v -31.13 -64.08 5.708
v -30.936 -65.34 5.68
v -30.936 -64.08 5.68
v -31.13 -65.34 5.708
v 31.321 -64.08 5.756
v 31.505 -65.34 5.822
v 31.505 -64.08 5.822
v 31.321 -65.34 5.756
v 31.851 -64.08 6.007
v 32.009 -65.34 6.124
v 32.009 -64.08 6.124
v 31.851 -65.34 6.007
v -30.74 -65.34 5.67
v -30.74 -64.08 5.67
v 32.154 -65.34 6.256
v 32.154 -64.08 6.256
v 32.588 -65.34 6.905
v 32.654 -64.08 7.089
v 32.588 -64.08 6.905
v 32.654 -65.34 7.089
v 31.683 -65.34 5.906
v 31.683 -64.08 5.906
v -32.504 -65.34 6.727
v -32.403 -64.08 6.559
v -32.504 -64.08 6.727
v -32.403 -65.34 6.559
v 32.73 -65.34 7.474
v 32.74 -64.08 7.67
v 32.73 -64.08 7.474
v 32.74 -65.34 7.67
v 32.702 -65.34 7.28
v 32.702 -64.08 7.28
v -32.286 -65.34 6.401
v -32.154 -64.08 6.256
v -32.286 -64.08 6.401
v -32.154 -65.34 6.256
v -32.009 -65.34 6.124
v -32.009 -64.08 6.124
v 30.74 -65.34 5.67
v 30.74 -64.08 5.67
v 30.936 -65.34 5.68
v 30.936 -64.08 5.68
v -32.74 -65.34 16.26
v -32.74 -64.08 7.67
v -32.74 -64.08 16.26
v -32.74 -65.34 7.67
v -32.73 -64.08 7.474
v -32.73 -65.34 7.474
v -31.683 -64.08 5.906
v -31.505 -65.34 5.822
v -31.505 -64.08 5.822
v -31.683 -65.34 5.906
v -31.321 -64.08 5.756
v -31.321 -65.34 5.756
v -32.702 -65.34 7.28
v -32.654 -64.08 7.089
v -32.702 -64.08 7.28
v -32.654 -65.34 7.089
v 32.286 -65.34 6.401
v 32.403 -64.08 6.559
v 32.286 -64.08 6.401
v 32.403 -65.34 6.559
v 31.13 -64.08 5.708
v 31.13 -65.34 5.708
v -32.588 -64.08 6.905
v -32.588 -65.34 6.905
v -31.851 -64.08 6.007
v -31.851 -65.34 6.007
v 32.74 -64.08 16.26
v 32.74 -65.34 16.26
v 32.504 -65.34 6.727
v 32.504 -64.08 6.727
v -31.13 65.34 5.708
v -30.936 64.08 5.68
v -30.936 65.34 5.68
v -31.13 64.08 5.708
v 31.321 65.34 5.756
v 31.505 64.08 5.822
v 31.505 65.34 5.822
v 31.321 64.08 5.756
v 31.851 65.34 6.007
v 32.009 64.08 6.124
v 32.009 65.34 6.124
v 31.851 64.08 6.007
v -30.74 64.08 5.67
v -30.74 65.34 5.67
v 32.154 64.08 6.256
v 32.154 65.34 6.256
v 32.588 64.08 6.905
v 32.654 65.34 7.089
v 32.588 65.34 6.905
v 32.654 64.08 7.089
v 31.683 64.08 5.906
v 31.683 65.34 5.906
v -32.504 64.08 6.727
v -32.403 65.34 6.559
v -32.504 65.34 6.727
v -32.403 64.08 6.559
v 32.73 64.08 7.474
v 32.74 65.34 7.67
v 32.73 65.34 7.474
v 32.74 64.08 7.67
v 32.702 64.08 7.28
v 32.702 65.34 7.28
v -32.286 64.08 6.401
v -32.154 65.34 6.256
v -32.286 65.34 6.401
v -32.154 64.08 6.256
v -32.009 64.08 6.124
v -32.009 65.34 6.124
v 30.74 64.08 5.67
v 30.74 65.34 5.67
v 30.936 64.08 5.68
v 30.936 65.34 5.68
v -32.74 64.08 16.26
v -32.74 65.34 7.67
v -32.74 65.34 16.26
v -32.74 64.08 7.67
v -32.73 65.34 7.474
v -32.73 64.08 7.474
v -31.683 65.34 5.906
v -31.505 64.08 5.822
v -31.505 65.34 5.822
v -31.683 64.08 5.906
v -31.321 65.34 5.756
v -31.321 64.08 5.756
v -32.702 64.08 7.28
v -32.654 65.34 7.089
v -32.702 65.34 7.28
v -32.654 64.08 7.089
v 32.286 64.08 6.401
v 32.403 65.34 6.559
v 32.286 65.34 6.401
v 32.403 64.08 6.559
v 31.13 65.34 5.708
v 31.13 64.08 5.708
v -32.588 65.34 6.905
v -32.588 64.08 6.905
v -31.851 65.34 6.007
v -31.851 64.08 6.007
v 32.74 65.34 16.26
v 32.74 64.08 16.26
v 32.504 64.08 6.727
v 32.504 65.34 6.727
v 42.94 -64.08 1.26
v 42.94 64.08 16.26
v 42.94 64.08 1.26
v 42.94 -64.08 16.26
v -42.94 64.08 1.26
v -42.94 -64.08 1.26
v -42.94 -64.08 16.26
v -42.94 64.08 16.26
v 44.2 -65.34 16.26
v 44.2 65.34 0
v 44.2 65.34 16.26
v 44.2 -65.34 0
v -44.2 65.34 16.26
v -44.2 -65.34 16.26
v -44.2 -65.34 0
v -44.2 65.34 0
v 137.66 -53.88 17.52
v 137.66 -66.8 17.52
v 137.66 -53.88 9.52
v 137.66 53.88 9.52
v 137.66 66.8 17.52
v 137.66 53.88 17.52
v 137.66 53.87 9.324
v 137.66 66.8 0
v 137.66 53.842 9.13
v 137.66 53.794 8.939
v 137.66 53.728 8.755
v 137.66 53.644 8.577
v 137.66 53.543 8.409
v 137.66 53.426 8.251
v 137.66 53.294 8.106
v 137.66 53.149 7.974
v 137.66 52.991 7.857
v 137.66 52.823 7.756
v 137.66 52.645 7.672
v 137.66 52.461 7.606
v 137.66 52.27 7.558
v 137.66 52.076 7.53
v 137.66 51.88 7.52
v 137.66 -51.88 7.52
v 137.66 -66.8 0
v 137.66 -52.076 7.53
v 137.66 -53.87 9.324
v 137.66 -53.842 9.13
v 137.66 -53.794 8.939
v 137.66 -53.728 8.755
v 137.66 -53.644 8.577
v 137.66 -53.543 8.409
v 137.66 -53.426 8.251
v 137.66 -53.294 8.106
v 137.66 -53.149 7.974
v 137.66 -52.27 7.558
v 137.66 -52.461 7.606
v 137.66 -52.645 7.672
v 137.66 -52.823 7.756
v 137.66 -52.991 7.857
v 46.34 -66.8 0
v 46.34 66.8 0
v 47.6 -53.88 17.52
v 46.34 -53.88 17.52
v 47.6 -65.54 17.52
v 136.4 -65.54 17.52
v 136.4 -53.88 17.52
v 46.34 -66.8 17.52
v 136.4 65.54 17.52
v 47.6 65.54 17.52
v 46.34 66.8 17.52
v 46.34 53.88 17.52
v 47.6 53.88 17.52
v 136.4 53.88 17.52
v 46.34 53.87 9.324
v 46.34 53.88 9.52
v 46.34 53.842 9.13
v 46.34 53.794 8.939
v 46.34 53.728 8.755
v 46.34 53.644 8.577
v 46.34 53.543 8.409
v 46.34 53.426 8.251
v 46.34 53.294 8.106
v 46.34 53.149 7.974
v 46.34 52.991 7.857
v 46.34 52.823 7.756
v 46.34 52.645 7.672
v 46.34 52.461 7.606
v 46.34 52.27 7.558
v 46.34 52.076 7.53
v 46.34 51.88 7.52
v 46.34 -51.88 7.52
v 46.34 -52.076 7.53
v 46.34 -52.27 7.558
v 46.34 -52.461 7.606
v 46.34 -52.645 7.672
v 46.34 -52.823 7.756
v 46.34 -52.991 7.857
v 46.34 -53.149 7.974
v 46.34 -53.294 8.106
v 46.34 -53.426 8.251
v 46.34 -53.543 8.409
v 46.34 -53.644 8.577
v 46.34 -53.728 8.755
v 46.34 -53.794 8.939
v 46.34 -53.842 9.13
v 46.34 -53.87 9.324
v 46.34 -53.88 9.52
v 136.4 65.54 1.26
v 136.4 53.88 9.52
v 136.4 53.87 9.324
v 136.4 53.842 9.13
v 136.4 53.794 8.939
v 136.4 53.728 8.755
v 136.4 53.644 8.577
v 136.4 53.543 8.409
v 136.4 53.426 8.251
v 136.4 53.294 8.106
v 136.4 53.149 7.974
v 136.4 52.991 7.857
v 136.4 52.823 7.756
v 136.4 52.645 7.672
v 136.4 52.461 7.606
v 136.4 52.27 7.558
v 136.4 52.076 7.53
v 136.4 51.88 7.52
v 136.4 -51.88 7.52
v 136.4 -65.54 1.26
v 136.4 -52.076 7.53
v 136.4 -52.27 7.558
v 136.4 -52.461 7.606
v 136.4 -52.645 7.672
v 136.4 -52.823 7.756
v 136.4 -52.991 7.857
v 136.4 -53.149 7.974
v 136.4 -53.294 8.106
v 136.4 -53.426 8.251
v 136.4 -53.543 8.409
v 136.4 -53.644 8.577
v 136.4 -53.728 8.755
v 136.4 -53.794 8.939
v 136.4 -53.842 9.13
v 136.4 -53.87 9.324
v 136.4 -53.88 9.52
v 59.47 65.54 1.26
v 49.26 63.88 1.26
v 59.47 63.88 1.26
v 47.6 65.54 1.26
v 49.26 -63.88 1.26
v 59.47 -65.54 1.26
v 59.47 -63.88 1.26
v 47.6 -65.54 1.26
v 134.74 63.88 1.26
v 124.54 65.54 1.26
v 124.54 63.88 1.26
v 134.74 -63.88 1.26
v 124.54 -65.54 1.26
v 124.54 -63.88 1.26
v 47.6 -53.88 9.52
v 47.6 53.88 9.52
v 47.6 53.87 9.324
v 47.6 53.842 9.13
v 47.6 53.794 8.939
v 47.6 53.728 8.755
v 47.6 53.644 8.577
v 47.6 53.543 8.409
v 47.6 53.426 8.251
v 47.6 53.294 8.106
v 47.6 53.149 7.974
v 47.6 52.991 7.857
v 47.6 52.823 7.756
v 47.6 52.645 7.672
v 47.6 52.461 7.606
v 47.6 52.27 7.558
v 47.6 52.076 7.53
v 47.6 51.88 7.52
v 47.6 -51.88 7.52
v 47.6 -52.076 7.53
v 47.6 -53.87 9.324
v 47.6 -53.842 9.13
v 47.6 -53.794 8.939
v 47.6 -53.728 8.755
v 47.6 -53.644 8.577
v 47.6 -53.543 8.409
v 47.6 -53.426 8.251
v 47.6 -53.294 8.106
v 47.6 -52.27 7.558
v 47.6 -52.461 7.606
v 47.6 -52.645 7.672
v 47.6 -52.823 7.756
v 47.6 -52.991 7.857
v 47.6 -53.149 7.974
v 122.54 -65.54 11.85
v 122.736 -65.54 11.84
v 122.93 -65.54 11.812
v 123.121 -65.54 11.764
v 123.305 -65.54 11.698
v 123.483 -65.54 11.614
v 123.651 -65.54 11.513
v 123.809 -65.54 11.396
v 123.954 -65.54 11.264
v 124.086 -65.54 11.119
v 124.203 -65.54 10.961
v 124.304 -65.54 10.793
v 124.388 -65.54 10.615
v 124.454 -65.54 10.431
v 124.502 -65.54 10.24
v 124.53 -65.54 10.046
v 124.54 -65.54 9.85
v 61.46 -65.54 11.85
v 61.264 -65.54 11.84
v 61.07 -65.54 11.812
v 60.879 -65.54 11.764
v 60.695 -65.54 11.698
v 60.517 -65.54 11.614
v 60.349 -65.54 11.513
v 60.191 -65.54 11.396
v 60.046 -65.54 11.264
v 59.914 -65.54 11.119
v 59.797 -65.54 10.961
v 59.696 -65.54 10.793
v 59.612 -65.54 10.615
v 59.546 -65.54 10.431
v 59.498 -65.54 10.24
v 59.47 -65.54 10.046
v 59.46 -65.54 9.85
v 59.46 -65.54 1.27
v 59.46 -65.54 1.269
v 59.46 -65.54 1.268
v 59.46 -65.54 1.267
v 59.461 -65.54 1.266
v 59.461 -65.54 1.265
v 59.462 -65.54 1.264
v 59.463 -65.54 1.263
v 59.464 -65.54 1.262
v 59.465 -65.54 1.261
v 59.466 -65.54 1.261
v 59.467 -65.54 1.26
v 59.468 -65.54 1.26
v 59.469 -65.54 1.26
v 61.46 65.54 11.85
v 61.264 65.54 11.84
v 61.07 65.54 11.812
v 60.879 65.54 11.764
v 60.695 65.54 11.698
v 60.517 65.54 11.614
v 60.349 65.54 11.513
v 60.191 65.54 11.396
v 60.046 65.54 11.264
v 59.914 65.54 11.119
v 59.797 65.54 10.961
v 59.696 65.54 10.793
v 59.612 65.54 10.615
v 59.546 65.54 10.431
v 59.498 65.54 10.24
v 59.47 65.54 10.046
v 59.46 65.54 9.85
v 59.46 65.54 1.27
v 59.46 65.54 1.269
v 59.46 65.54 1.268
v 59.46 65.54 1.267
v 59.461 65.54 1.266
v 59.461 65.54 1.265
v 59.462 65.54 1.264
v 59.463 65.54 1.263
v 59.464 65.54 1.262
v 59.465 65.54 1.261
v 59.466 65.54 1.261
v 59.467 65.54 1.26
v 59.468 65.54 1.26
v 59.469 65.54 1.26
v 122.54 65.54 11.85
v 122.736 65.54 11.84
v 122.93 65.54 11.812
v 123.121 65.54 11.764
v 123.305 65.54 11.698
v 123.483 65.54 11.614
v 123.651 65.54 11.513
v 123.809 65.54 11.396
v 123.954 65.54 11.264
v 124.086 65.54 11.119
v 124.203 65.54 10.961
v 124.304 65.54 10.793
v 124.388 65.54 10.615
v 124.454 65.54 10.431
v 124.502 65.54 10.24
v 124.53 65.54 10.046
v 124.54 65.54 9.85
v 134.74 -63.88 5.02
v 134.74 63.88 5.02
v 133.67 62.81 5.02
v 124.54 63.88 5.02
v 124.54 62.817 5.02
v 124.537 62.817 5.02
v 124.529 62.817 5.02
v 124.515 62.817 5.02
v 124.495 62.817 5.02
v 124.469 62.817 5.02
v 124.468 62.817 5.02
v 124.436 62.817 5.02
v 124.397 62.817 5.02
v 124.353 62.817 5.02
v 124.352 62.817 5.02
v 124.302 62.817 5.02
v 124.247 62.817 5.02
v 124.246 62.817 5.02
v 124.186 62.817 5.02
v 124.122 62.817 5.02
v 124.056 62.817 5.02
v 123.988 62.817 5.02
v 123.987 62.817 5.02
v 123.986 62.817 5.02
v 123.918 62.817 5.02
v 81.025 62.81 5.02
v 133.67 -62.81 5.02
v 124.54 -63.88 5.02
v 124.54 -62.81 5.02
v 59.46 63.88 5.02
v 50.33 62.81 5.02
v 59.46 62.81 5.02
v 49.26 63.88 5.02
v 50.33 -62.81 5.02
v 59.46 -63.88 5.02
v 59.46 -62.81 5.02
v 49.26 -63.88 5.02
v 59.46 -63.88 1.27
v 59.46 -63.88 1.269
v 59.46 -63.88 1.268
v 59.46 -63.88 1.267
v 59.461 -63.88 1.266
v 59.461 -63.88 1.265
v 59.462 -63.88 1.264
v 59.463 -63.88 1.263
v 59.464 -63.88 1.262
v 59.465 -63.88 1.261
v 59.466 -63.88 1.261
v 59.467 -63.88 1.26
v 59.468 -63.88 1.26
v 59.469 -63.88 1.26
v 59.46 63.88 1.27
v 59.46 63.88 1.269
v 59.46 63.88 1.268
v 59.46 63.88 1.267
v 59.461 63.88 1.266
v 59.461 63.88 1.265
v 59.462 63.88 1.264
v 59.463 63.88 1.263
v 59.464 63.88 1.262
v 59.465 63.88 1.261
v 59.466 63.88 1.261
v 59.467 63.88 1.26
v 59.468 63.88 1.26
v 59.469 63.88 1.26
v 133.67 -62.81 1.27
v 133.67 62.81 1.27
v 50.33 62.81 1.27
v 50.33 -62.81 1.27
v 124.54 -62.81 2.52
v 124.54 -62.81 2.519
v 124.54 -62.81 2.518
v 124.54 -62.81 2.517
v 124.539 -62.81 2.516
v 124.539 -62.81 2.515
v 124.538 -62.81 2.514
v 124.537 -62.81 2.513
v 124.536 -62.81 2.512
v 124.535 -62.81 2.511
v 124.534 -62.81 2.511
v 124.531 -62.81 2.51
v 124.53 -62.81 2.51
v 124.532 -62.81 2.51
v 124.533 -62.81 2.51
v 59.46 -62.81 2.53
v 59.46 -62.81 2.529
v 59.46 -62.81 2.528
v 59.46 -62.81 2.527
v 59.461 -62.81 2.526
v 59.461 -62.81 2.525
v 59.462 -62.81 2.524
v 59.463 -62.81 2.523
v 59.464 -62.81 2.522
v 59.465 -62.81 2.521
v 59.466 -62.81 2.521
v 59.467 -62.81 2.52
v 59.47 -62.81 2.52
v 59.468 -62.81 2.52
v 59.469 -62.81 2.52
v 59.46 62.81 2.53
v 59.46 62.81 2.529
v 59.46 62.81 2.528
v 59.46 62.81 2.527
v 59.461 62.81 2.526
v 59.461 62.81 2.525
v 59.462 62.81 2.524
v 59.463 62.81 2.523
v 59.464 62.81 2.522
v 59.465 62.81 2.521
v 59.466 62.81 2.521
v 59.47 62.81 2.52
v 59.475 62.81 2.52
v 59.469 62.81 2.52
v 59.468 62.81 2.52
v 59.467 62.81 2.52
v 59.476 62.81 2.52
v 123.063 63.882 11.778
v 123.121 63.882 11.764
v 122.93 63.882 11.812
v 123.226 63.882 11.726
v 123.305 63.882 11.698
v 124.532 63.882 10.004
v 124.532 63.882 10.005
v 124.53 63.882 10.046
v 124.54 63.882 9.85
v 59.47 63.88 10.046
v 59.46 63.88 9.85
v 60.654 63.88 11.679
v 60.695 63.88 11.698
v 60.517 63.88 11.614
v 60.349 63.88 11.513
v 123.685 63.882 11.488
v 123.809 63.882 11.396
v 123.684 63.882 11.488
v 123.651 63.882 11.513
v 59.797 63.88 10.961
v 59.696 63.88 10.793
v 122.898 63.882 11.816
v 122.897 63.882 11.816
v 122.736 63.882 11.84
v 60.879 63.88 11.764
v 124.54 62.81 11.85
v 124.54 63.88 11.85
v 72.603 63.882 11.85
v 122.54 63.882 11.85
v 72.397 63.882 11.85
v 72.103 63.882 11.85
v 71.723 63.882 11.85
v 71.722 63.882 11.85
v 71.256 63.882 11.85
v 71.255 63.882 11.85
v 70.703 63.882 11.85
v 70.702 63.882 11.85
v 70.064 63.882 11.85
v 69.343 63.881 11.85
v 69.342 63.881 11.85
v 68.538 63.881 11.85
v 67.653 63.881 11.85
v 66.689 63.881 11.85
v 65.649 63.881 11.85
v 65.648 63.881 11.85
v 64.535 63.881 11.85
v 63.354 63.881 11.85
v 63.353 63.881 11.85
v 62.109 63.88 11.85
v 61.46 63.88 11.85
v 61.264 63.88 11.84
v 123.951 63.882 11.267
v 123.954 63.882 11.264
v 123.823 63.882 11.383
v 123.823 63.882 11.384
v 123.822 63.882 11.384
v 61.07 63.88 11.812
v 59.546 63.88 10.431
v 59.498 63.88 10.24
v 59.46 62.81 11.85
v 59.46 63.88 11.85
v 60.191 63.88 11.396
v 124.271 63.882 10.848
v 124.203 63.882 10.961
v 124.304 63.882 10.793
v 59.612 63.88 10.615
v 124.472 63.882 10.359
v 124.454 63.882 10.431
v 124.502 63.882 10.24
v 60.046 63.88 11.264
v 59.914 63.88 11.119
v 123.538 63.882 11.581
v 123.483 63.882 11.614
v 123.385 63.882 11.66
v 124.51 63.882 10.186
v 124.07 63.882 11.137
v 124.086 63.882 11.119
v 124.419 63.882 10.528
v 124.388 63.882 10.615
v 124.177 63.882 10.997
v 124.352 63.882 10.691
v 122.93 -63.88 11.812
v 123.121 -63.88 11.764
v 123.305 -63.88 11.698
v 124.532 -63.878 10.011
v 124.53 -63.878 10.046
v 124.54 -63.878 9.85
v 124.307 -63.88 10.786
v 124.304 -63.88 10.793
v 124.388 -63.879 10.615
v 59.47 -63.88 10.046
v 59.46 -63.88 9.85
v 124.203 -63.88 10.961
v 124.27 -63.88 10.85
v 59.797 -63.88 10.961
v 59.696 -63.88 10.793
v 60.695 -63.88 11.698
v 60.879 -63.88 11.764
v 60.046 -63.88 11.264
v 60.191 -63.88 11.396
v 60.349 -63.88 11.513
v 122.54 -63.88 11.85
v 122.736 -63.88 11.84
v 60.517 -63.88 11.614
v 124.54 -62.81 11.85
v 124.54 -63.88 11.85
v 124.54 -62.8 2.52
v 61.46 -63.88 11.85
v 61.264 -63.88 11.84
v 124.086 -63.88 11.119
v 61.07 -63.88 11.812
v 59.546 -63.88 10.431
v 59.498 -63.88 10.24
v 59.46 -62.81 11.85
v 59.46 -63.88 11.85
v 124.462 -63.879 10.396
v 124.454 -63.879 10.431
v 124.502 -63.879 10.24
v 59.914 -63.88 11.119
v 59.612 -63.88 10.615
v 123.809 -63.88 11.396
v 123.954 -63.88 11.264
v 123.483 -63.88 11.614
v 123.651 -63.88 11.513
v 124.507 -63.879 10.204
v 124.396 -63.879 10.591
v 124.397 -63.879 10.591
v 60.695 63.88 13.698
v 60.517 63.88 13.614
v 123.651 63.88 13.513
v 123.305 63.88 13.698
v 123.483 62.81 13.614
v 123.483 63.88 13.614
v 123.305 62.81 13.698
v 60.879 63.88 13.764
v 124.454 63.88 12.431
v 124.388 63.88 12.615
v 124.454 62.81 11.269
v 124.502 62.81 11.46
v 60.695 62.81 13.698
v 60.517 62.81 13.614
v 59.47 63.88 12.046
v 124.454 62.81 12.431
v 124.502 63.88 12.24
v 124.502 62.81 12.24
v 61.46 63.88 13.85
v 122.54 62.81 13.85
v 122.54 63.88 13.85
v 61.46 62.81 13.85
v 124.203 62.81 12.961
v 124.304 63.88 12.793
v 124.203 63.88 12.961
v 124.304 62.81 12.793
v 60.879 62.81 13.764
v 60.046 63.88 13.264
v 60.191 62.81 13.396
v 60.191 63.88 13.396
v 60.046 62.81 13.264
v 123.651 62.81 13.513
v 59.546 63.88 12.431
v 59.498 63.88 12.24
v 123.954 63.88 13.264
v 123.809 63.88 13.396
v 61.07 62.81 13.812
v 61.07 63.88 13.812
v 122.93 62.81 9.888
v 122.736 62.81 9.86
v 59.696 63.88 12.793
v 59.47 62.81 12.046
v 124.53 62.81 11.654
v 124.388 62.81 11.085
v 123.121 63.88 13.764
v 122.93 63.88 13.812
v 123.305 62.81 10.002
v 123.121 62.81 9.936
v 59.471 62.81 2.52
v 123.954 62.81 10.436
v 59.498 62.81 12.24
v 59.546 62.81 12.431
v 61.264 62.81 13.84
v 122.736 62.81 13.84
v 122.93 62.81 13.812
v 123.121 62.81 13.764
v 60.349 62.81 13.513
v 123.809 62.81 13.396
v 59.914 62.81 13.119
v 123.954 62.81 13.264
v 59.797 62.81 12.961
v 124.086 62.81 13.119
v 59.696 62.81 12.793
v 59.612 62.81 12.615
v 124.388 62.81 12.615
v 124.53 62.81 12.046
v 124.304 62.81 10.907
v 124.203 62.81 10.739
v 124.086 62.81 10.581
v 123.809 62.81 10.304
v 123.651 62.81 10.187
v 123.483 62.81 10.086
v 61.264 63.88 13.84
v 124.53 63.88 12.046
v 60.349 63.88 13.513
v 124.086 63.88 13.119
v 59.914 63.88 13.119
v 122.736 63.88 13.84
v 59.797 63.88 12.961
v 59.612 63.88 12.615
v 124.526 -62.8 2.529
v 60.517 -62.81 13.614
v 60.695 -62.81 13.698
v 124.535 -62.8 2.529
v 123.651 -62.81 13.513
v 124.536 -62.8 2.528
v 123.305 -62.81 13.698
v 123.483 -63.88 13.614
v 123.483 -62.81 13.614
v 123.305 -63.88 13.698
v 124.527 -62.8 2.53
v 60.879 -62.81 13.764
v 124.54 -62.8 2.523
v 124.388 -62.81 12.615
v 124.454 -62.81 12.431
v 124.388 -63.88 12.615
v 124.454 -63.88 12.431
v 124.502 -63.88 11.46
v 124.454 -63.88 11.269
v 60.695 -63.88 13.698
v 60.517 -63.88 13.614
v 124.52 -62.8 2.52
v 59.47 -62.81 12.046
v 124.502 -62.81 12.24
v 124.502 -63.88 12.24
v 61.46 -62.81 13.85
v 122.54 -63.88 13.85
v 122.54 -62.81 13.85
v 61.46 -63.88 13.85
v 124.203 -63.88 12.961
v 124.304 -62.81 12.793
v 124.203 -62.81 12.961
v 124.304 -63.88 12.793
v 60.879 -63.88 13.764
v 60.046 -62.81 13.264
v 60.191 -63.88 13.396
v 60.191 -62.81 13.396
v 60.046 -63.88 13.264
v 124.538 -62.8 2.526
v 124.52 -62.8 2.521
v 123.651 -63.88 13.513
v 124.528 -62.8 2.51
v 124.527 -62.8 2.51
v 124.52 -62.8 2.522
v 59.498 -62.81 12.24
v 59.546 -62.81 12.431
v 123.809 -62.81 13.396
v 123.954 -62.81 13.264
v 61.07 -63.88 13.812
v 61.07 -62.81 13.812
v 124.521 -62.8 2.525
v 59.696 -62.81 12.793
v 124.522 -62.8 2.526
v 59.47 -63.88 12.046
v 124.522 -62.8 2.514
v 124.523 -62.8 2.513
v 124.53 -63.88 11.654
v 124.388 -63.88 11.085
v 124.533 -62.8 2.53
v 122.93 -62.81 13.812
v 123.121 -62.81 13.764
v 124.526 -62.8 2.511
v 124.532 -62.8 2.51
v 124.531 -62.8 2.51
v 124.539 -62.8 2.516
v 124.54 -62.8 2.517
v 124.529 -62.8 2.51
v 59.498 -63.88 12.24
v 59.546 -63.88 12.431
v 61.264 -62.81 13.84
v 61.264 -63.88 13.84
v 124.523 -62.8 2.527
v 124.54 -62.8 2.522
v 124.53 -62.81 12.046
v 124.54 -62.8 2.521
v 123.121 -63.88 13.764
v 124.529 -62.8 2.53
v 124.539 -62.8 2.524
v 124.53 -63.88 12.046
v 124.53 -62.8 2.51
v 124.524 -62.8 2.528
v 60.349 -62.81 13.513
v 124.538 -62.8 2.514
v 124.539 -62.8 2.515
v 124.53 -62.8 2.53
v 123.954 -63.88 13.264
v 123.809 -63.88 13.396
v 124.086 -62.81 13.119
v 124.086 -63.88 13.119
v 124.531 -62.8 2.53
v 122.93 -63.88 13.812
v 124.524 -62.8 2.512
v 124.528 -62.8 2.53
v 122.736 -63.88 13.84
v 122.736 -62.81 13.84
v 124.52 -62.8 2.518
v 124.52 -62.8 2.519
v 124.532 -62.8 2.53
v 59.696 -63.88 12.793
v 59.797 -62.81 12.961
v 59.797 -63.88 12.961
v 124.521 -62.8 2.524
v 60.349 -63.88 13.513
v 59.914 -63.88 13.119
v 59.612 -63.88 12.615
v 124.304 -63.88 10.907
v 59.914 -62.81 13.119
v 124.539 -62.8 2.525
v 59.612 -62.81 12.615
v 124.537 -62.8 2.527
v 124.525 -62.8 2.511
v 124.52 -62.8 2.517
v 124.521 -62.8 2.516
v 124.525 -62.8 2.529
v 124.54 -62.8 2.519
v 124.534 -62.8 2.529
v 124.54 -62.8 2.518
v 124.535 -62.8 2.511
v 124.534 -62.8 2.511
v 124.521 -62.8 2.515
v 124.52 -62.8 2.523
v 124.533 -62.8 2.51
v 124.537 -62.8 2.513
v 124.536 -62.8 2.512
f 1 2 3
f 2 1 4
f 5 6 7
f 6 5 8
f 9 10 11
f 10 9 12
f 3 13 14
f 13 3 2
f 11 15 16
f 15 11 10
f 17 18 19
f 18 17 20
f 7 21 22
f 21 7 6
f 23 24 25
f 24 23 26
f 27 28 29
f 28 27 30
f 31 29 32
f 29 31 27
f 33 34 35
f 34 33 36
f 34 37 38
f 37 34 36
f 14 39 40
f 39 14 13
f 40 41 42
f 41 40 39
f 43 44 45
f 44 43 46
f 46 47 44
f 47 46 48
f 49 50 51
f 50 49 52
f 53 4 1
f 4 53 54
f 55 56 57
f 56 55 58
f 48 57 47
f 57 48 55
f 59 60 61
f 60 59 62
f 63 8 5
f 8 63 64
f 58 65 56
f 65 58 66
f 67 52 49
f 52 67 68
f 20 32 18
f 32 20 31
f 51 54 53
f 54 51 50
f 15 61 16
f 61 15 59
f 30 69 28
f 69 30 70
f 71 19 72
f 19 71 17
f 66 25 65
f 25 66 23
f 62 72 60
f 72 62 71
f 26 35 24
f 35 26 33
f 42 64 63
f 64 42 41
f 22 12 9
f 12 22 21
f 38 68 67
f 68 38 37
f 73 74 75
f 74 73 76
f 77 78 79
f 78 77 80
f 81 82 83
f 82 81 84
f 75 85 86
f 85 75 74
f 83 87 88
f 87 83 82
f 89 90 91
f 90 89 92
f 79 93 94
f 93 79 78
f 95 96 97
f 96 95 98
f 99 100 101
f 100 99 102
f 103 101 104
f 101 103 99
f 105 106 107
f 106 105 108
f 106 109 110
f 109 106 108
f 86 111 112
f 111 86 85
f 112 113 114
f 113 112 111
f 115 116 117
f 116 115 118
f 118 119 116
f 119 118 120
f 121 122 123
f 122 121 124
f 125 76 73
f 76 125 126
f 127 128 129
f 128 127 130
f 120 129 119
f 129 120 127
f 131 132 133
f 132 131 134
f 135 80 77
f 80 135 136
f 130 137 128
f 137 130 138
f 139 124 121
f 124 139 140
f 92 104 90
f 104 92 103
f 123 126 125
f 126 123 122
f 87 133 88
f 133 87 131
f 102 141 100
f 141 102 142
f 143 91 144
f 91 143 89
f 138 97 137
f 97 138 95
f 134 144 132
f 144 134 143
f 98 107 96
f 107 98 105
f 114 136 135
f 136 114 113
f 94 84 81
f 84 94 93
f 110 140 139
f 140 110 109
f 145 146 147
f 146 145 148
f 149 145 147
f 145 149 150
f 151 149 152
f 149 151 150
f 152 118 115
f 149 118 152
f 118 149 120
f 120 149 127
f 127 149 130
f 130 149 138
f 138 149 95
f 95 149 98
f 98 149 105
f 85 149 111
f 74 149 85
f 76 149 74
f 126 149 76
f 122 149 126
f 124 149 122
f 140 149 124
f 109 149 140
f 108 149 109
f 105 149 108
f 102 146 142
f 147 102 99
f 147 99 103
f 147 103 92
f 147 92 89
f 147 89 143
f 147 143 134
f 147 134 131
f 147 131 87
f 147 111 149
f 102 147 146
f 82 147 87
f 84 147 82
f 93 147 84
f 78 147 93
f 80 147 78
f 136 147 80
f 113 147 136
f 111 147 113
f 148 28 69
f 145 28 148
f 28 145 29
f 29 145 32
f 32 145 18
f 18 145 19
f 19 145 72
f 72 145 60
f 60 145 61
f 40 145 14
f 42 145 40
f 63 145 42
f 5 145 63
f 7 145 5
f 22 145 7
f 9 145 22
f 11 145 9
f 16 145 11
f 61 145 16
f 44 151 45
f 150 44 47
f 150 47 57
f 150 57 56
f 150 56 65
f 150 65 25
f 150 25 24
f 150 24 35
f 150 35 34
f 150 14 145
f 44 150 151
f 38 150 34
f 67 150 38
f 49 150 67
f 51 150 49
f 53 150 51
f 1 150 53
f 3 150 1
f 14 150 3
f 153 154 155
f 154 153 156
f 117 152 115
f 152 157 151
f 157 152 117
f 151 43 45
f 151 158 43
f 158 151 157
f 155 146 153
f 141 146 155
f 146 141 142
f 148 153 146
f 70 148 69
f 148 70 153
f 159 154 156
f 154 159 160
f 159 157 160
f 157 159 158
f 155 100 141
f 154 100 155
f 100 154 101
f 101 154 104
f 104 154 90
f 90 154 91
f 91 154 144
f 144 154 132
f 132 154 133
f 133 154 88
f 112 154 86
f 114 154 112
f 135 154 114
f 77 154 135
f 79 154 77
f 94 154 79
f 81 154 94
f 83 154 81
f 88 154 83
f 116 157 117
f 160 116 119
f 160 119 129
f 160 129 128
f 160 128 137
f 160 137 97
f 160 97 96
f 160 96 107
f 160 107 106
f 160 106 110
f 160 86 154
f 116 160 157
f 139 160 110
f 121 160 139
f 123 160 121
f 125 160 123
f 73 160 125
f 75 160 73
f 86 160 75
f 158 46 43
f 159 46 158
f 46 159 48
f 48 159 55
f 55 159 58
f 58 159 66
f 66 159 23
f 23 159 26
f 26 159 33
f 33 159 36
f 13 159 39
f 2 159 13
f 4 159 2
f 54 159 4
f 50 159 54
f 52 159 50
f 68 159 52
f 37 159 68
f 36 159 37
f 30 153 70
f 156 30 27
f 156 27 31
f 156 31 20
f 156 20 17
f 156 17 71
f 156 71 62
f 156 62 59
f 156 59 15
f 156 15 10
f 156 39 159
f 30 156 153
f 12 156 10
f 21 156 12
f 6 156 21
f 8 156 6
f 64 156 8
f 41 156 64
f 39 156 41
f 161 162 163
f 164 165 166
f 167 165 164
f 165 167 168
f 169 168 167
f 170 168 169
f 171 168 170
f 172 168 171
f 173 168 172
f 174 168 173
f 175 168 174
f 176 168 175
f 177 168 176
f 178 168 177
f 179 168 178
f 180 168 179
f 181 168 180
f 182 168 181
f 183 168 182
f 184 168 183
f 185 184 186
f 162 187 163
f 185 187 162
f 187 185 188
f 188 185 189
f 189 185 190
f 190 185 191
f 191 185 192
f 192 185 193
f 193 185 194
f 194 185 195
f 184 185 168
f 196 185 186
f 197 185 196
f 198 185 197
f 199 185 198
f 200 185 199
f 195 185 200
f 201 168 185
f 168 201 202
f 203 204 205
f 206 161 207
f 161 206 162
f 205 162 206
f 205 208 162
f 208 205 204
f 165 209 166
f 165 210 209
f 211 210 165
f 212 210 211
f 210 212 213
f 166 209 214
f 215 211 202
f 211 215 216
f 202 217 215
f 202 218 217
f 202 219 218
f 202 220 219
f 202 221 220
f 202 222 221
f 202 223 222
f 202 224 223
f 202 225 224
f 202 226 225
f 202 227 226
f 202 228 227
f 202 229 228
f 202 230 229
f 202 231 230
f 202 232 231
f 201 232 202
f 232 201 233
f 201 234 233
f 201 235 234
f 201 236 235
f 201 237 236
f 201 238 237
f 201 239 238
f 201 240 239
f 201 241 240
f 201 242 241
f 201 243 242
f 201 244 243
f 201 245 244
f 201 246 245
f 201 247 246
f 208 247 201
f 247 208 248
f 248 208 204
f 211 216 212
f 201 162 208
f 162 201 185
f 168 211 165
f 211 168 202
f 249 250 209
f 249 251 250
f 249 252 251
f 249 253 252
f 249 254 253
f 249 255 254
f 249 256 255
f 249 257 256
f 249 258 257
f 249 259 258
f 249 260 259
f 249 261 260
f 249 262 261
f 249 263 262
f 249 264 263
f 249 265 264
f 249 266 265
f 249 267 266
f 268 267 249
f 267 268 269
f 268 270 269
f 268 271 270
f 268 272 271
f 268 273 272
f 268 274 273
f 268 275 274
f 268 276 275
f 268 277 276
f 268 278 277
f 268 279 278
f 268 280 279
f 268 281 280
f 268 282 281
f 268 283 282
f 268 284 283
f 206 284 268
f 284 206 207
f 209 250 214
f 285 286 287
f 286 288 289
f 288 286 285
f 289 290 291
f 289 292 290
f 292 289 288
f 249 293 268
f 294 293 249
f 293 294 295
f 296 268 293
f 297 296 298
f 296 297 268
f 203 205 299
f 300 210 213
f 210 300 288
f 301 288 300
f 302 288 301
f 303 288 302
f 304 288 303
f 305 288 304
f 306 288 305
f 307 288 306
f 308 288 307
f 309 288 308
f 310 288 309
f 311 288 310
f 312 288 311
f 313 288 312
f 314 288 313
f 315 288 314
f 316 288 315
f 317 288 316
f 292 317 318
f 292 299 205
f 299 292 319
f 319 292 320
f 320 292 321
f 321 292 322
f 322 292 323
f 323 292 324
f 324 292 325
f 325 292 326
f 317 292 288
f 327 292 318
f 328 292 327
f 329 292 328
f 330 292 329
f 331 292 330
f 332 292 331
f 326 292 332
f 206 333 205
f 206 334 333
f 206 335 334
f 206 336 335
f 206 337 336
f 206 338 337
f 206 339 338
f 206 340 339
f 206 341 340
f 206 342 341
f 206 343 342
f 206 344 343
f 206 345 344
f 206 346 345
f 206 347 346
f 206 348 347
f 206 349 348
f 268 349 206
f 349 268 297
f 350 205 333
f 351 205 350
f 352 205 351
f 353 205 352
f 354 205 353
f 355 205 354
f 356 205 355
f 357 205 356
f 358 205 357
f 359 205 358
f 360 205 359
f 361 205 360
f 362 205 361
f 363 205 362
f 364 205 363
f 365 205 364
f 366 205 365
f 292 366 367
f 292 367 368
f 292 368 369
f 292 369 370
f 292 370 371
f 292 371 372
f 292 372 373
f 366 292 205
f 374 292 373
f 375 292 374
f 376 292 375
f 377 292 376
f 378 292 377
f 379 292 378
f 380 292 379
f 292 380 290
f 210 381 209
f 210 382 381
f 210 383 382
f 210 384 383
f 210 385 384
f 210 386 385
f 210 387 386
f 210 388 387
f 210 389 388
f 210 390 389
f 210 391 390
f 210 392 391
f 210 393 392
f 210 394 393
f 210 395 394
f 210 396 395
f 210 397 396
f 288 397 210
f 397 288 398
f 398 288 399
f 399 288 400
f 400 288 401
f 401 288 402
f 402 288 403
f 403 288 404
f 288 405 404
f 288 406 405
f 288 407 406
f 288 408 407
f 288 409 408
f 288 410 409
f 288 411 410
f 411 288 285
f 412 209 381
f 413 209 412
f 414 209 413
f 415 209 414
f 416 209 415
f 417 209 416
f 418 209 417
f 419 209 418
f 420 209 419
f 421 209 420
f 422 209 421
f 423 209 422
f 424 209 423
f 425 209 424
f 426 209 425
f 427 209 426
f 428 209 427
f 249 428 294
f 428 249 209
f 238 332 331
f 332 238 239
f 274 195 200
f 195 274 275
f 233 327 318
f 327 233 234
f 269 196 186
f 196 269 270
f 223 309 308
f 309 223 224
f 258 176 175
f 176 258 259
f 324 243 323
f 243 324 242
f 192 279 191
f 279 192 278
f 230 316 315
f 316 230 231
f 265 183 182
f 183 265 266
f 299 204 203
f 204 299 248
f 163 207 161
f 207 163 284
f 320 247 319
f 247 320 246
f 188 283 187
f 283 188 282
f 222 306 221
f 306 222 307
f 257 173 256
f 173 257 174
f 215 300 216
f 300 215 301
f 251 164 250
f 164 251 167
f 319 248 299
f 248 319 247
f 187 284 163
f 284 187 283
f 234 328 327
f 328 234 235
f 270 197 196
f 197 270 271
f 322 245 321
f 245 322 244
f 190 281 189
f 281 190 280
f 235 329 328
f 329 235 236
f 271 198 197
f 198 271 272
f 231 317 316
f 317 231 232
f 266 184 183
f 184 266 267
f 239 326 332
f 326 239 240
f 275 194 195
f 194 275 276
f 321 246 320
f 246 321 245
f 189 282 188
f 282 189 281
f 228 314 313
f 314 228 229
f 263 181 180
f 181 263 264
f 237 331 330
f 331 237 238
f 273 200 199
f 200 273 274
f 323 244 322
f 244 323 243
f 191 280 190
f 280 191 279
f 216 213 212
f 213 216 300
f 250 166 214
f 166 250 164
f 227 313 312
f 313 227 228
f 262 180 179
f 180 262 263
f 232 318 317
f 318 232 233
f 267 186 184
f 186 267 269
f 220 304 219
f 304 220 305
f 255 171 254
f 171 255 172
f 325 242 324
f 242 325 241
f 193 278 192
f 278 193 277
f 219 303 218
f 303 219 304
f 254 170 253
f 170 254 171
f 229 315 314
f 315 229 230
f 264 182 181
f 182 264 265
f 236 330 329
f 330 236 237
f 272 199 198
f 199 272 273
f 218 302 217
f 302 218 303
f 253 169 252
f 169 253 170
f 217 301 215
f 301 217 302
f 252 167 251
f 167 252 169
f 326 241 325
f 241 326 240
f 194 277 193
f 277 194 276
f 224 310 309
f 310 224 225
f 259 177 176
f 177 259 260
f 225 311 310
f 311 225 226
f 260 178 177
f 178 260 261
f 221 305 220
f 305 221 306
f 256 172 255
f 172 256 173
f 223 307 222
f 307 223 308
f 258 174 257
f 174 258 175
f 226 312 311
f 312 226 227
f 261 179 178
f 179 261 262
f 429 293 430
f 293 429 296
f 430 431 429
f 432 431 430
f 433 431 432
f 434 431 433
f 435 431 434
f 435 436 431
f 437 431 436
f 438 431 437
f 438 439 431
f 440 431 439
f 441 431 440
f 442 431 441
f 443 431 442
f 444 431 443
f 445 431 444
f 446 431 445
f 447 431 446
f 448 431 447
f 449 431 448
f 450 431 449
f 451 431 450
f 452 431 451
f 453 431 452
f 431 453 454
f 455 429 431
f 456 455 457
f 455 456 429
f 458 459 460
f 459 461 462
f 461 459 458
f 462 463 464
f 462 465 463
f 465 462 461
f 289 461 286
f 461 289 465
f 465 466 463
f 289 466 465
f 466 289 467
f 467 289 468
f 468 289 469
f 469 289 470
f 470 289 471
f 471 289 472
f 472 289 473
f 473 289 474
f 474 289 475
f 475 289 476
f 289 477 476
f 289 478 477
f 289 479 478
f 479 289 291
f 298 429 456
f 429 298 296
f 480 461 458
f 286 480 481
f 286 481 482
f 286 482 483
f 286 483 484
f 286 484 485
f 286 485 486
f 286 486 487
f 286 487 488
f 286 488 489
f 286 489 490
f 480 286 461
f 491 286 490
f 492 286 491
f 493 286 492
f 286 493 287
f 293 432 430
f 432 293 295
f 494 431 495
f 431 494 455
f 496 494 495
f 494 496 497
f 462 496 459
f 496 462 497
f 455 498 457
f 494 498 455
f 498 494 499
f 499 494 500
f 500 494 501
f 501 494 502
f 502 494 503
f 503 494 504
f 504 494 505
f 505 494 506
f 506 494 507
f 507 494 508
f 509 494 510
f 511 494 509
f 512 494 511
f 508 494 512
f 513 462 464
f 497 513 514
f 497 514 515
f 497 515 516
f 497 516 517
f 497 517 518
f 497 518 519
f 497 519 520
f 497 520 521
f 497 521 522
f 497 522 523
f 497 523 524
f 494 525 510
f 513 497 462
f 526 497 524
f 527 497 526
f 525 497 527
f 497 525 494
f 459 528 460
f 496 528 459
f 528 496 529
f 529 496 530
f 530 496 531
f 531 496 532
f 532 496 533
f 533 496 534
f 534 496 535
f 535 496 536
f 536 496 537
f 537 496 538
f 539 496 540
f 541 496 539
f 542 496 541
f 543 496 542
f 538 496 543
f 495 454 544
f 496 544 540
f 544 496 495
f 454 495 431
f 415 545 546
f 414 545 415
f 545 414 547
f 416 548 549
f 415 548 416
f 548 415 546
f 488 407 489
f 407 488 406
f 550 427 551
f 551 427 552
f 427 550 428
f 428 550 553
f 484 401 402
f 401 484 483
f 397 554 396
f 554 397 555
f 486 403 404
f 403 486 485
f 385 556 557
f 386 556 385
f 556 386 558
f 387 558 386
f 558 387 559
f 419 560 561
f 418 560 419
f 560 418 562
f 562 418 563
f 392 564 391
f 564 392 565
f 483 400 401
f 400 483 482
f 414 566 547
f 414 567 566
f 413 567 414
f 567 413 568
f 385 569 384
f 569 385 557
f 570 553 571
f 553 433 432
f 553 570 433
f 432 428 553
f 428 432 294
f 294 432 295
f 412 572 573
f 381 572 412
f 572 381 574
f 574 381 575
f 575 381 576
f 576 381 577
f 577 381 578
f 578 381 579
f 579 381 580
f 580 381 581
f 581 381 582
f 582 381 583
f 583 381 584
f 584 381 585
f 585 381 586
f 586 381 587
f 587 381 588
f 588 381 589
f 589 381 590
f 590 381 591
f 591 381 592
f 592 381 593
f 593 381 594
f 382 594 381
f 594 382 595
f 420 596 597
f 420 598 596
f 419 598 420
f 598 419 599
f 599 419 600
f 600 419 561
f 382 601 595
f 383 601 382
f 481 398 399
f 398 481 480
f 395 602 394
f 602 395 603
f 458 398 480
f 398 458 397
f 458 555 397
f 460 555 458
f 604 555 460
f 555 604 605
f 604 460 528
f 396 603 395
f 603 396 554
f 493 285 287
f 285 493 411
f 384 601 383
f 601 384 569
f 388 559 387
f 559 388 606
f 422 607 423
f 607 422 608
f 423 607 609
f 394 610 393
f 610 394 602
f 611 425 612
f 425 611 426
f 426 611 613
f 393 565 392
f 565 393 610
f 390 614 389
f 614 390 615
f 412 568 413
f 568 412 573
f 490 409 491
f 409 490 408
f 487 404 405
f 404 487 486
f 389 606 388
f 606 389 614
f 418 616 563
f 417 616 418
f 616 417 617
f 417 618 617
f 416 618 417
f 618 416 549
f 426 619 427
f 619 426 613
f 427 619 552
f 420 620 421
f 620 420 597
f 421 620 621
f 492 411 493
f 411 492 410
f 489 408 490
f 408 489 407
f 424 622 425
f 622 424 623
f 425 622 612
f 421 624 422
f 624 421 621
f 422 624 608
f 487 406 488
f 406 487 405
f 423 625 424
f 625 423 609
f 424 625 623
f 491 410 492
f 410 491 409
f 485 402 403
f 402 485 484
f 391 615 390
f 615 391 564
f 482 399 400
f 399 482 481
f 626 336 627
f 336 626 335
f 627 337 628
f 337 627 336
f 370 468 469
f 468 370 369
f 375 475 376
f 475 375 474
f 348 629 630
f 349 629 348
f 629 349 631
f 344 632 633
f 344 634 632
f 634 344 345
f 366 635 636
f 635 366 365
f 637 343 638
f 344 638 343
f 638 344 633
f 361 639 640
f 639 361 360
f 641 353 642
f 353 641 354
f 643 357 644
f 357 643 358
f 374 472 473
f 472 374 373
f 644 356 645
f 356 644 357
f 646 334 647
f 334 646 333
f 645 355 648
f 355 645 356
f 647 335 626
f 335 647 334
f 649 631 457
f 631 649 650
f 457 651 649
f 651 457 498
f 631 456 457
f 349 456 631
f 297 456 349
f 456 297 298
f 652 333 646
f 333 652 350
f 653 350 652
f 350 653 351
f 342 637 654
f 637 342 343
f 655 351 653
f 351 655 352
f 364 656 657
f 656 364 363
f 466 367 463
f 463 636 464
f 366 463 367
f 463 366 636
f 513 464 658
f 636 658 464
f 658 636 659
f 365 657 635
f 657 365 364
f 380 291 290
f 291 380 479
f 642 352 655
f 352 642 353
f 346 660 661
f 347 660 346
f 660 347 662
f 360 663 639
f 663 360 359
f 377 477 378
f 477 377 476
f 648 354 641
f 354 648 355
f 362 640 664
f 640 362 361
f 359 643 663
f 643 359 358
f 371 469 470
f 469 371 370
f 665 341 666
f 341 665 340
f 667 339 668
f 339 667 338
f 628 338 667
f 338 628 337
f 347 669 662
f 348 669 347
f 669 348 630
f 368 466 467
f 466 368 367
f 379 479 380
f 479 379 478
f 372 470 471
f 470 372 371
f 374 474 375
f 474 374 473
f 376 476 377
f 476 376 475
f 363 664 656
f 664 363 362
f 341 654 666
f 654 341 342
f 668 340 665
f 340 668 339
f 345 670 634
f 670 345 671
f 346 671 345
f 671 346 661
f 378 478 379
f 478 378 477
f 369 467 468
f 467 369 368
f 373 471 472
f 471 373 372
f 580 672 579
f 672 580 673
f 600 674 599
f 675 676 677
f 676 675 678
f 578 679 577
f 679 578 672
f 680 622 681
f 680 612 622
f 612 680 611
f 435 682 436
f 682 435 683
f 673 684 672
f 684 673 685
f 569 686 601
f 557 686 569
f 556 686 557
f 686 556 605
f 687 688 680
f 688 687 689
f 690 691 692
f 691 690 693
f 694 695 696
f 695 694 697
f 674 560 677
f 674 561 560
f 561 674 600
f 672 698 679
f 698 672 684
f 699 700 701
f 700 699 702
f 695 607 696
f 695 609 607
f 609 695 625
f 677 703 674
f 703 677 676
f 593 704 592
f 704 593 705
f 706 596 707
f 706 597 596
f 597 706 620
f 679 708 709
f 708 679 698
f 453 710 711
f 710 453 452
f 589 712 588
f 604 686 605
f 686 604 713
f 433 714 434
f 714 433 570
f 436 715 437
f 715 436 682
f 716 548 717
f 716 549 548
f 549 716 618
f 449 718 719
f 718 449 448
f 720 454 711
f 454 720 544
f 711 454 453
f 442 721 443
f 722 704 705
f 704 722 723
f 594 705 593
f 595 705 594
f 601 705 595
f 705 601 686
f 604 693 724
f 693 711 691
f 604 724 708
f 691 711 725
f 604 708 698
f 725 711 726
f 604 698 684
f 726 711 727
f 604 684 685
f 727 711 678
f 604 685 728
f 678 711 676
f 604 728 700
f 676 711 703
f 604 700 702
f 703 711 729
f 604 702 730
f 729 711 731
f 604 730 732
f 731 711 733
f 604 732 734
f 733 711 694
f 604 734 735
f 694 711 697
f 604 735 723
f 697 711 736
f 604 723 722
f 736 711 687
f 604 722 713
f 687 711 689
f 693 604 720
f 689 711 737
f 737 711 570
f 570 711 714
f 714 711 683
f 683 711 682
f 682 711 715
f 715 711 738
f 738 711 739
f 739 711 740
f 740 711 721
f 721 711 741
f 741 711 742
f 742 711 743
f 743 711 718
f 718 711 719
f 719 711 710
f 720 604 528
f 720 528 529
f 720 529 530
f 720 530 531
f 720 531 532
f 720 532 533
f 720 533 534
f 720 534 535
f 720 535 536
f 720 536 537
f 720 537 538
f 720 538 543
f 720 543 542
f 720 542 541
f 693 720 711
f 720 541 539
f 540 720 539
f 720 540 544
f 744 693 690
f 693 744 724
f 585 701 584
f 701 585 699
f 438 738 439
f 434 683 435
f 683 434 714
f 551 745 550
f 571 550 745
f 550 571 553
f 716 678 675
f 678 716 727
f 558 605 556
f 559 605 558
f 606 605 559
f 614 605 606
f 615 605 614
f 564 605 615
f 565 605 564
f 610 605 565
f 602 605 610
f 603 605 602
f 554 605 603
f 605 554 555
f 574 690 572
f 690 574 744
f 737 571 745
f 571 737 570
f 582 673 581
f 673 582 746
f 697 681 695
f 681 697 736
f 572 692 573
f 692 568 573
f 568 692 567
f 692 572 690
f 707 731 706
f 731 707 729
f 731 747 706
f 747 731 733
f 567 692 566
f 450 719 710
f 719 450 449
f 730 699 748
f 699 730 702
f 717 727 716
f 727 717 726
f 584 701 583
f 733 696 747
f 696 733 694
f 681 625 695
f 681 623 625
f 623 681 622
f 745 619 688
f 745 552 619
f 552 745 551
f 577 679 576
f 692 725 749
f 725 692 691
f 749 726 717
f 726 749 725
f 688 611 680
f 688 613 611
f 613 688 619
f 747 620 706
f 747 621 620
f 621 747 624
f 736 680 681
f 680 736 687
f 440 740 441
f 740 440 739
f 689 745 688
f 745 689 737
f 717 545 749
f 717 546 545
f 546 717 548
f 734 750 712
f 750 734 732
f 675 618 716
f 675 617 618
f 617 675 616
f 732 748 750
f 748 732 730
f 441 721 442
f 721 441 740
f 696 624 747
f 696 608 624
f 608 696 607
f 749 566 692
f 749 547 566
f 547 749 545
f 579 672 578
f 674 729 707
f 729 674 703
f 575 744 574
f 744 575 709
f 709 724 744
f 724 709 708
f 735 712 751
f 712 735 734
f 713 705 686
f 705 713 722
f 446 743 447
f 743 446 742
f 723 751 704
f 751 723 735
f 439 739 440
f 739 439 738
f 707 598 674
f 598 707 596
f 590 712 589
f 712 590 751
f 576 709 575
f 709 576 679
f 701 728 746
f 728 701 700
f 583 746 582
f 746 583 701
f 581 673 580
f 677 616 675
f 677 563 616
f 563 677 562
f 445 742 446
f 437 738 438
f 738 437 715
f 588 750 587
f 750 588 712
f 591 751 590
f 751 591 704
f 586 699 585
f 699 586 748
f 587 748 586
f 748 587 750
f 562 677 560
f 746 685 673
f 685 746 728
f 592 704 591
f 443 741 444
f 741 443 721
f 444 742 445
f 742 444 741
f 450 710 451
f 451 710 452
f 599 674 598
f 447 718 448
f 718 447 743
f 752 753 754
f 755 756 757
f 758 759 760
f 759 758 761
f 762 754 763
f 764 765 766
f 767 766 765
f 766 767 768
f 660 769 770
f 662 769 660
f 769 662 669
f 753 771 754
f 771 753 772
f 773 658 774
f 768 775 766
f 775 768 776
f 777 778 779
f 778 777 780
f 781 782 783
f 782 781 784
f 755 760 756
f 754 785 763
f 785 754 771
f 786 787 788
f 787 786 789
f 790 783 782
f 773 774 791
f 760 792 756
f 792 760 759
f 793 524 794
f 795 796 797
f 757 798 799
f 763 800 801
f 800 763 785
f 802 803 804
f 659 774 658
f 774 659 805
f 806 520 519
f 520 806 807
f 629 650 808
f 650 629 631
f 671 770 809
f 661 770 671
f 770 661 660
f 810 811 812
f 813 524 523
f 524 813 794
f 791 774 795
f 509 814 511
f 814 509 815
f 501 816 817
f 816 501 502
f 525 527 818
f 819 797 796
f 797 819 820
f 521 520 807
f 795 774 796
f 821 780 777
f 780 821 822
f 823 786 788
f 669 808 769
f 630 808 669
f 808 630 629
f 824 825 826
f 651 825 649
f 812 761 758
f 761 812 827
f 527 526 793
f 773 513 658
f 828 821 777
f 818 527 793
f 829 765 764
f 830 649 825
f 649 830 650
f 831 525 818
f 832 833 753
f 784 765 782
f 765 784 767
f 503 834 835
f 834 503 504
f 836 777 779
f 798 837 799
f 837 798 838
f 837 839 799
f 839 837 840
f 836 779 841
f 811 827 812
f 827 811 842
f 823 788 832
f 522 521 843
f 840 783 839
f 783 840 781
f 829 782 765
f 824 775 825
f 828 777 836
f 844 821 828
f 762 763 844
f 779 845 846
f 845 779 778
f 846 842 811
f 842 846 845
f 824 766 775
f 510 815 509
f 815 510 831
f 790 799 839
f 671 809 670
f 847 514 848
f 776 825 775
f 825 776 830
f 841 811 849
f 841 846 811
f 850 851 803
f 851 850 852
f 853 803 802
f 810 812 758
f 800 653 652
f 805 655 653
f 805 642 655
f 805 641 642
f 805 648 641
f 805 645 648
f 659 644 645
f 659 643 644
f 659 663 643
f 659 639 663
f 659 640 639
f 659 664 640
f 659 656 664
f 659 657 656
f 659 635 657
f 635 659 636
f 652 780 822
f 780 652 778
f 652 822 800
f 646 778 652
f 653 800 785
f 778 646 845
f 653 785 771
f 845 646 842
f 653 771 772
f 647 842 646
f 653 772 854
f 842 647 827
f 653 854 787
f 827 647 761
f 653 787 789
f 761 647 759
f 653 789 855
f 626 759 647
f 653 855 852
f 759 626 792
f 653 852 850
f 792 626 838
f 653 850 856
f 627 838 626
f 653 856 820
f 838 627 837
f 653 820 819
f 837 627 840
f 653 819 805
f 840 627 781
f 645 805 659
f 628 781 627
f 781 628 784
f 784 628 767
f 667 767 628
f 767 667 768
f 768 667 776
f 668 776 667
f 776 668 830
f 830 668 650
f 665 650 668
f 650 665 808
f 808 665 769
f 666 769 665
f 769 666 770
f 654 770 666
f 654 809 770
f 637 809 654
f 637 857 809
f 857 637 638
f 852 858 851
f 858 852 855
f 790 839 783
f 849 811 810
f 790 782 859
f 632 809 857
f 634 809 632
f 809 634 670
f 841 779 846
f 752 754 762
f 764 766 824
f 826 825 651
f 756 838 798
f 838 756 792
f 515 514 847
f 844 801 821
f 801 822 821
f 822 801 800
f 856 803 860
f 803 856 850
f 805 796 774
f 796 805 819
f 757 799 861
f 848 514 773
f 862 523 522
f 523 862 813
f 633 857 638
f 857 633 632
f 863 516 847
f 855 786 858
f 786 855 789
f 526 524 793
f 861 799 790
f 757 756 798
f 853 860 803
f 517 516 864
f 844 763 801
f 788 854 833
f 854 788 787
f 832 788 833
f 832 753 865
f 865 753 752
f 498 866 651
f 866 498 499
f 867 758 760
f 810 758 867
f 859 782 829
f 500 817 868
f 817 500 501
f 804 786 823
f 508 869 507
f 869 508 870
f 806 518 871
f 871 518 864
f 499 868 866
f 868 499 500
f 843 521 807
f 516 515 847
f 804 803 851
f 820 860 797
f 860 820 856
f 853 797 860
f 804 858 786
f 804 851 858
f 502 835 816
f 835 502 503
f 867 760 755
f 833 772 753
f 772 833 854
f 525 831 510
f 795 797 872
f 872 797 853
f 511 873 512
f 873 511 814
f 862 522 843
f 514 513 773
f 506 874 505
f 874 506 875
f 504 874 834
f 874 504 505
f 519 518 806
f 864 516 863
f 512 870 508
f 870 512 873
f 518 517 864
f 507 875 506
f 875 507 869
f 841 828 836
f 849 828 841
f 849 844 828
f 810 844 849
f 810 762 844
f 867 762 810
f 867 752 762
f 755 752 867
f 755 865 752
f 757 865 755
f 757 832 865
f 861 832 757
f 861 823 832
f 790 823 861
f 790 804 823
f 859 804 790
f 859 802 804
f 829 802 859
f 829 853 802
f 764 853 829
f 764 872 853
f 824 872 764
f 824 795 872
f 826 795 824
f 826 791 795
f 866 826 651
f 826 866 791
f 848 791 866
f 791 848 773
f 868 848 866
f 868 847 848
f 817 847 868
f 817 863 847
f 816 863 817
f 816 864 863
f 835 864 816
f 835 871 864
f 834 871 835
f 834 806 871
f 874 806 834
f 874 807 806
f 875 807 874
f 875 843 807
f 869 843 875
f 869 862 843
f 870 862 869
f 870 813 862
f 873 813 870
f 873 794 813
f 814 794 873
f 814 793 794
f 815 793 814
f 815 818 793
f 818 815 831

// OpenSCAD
// file: modules/SLAS_plate.scad
SLAS_PLATE_WIDTH = 85.48;
SLAS_PLATE_DEPTH = 127.76;
SLAS_PLATE_FLANGE_WIDTH = 1.27;

SLAS_PLATE_FLANGE_HEIGHT_SHORT = 2.41; 
SLAS_PLATE_FLANGE_WIDTH = 1.27;
SLAS_PLATE_FLANGE_RADIUS_OUTSIDE_CORNER = 3.18;
// main file
// Two-piece box for SLAS plates. v1.0.0
// Last updated: 2023-10-24
// (c) Constantine Evans, 2023.
// SPDX-License-Identifier:  CC-BY-SA-4.0

$fn = 64;


// Maximum total height of the plate.
plate_max_height = 15;

// SLAS flange height values.
plate_flange_height = 2.41; // [2.41:short, 6.10:medium, 7.62:tall]

// (elements will be multiples of this thickness)
base_thickness = 0.42;
bottom_multiple = 3;
wall_multiple = 3;

// Components will be separated by this tolerance.
inside_tolerance = 0.2;

bottom_thickness = bottom_multiple*base_thickness;
wall_thickness = wall_multiple*base_thickness;

include_components = "both"; // ["top", "bottom", "both"]


if (include_bottom) {
bottom(plate_max_height=plate_max_height, plate_flange_height=plate_flange_height);
}

// Minimal offset to avoid OpenSCAD problems.
minimal_offset = 0.01;


include_top = (include_components == "top" || include_components == "both");
include_bottom = (include_components == "bottom" || include_components == "both");

include <modules/SLAS_plate.scad>


if (include_top) {
translate([include_bottom ? SLAS_PLATE_WIDTH+wall_thickness*2+4 : 0,0,plate_max_height+bottom_thickness*2])
rotate([180,0,0])
top(plate_max_height=plate_max_height, plate_flange_height=plate_flange_height);
}


module extruded_rounded_rectangle(w, h, d, r) {
    hull() {
        translate([-w/2+r, -h/2+r, 0]) cylinder(r=r, h=d, center=true);
        translate([w/2-r, -h/2+r, 0]) cylinder(r=r, h=d, center=true);
        translate([-w/2+r, h/2-r, 0]) cylinder(r=r, h=d, center=true);
        translate([w/2-r, h/2-r, 0]) cylinder(r=r, h=d, center=true);
    }
}

module extruded_half_rounded_rectangle(w, h, d, r) {
    hull() {
        translate([-w/2+r, -h/2+r, 0]) cylinder(r=r, h=d, center=true);
        translate([w/2-r, -h/2+r, 0]) cylinder(r=r, h=d, center=true);
        translate([-w/2+minimal_offset, h/2-minimal_offset, 0]) cylinder(r=minimal_offset, h=d, center=true);
        translate([w/2-minimal_offset, h/2-0, minimal_offset]) cylinder(r=minimal_offset, h=d, center=true);
    }
}

module bottom(plate_max_height=17, plate_flange_height=2.41, neg=false) {

eh = neg ? inside_tolerance : 0;
em = neg ? minimal_offset : 0;

difference()
{
translate([-(SLAS_PLATE_WIDTH + 2*inside_tolerance + 2*wall_thickness + 2*eh)/2, 
    -(SLAS_PLATE_DEPTH + 2*inside_tolerance + 2*wall_thickness + 2*eh)/2, -em])
cube([SLAS_PLATE_WIDTH + 2*inside_tolerance + 2*wall_thickness + 2*eh, 
    SLAS_PLATE_DEPTH + 2*inside_tolerance + 2*wall_thickness + 2*eh, 
    plate_max_height + bottom_thickness + em]);

if (neg==false) {
translate([-(SLAS_PLATE_WIDTH + 2*inside_tolerance)/2, 
    -(SLAS_PLATE_DEPTH + 2*inside_tolerance)/2, 
    bottom_thickness - em])
cube([SLAS_PLATE_WIDTH + 2*inside_tolerance, 
    SLAS_PLATE_DEPTH + 2*inside_tolerance, 
    plate_max_height + minimal_offset + em]);

for (i=[-1:2:1]) {
translate([0,i*(SLAS_PLATE_DEPTH/2+inside_tolerance+wall_thickness/2+eh/2),plate_max_height/2 + plate_flange_height + bottom_thickness + 2])
rotate([90, 0, 0])
color("blue")
extruded_rounded_rectangle(SLAS_PLATE_WIDTH-20-2*eh, plate_max_height, wall_thickness+2*minimal_offset+eh, 2);
}
}
}

}

// bottom(neg=false);
module top(plate_max_height=17, plate_flange_height=2.41) {
difference() {
    translate([-(SLAS_PLATE_WIDTH + 2*inside_tolerance + 4*wall_thickness + 2*inside_tolerance)/2, 
    -(SLAS_PLATE_DEPTH + 2*inside_tolerance + 4*wall_thickness + 2*inside_tolerance)/2, 0])
    cube([SLAS_PLATE_WIDTH + 2*inside_tolerance + 4*wall_thickness + 2*inside_tolerance, 
    SLAS_PLATE_DEPTH + 2*inside_tolerance + 4*wall_thickness + 2*inside_tolerance, 
    plate_max_height + bottom_thickness*2]);
    
    bottom(plate_max_height=plate_max_height, plate_flange_height=plate_flange_height, neg=true);
    translate([0,0,plate_max_height/2 - 5])
    rotate([0, 90, 0])
    extruded_rounded_rectangle(plate_max_height, SLAS_PLATE_DEPTH-20, 2*SLAS_PLATE_WIDTH, 2);
}

lt = SLAS_PLATE_FLANGE_WIDTH - inside_tolerance;
echo(lt);
tlh=2.5;
translate([-(SLAS_PLATE_WIDTH)/2, 
    -(SLAS_PLATE_DEPTH)/2, 
    plate_max_height-tlh])
difference() {
cube([SLAS_PLATE_WIDTH, 
    SLAS_PLATE_DEPTH, 
    tlh+bottom_thickness]);
translate([lt, lt, -minimal_offset])
cube([SLAS_PLATE_WIDTH - lt*2, 
    SLAS_PLATE_DEPTH - lt*2, 
    tlh+bottom_thickness]);
}

drop_height = plate_flange_height + bottom_thickness + 2;
for (i=[-1:2:1]) {
translate([0,i*(SLAS_PLATE_DEPTH/2+inside_tolerance+wall_thickness/2),
    (plate_max_height-drop_height)/2 + drop_height +bottom_thickness/2])
rotate([90, 0, 0])
color("blue")
extruded_half_rounded_rectangle(SLAS_PLATE_WIDTH-20-2*inside_tolerance, plate_max_height-drop_height+bottom_thickness, wall_thickness+2*minimal_offset+2*inside_tolerance, 2);
}

drop_height_inner = plate_flange_height + bottom_thickness ;
for (i=[-1:2:1]) {
translate([0,i*(SLAS_PLATE_DEPTH/2-lt/2),
    (plate_max_height-drop_height_inner)/2 + drop_height_inner ])
rotate([90, 0, 0])
color("orange")
extruded_half_rounded_rectangle(SLAS_PLATE_WIDTH-20-2*inside_tolerance, plate_max_height-drop_height_inner, lt, 2);
}
}
